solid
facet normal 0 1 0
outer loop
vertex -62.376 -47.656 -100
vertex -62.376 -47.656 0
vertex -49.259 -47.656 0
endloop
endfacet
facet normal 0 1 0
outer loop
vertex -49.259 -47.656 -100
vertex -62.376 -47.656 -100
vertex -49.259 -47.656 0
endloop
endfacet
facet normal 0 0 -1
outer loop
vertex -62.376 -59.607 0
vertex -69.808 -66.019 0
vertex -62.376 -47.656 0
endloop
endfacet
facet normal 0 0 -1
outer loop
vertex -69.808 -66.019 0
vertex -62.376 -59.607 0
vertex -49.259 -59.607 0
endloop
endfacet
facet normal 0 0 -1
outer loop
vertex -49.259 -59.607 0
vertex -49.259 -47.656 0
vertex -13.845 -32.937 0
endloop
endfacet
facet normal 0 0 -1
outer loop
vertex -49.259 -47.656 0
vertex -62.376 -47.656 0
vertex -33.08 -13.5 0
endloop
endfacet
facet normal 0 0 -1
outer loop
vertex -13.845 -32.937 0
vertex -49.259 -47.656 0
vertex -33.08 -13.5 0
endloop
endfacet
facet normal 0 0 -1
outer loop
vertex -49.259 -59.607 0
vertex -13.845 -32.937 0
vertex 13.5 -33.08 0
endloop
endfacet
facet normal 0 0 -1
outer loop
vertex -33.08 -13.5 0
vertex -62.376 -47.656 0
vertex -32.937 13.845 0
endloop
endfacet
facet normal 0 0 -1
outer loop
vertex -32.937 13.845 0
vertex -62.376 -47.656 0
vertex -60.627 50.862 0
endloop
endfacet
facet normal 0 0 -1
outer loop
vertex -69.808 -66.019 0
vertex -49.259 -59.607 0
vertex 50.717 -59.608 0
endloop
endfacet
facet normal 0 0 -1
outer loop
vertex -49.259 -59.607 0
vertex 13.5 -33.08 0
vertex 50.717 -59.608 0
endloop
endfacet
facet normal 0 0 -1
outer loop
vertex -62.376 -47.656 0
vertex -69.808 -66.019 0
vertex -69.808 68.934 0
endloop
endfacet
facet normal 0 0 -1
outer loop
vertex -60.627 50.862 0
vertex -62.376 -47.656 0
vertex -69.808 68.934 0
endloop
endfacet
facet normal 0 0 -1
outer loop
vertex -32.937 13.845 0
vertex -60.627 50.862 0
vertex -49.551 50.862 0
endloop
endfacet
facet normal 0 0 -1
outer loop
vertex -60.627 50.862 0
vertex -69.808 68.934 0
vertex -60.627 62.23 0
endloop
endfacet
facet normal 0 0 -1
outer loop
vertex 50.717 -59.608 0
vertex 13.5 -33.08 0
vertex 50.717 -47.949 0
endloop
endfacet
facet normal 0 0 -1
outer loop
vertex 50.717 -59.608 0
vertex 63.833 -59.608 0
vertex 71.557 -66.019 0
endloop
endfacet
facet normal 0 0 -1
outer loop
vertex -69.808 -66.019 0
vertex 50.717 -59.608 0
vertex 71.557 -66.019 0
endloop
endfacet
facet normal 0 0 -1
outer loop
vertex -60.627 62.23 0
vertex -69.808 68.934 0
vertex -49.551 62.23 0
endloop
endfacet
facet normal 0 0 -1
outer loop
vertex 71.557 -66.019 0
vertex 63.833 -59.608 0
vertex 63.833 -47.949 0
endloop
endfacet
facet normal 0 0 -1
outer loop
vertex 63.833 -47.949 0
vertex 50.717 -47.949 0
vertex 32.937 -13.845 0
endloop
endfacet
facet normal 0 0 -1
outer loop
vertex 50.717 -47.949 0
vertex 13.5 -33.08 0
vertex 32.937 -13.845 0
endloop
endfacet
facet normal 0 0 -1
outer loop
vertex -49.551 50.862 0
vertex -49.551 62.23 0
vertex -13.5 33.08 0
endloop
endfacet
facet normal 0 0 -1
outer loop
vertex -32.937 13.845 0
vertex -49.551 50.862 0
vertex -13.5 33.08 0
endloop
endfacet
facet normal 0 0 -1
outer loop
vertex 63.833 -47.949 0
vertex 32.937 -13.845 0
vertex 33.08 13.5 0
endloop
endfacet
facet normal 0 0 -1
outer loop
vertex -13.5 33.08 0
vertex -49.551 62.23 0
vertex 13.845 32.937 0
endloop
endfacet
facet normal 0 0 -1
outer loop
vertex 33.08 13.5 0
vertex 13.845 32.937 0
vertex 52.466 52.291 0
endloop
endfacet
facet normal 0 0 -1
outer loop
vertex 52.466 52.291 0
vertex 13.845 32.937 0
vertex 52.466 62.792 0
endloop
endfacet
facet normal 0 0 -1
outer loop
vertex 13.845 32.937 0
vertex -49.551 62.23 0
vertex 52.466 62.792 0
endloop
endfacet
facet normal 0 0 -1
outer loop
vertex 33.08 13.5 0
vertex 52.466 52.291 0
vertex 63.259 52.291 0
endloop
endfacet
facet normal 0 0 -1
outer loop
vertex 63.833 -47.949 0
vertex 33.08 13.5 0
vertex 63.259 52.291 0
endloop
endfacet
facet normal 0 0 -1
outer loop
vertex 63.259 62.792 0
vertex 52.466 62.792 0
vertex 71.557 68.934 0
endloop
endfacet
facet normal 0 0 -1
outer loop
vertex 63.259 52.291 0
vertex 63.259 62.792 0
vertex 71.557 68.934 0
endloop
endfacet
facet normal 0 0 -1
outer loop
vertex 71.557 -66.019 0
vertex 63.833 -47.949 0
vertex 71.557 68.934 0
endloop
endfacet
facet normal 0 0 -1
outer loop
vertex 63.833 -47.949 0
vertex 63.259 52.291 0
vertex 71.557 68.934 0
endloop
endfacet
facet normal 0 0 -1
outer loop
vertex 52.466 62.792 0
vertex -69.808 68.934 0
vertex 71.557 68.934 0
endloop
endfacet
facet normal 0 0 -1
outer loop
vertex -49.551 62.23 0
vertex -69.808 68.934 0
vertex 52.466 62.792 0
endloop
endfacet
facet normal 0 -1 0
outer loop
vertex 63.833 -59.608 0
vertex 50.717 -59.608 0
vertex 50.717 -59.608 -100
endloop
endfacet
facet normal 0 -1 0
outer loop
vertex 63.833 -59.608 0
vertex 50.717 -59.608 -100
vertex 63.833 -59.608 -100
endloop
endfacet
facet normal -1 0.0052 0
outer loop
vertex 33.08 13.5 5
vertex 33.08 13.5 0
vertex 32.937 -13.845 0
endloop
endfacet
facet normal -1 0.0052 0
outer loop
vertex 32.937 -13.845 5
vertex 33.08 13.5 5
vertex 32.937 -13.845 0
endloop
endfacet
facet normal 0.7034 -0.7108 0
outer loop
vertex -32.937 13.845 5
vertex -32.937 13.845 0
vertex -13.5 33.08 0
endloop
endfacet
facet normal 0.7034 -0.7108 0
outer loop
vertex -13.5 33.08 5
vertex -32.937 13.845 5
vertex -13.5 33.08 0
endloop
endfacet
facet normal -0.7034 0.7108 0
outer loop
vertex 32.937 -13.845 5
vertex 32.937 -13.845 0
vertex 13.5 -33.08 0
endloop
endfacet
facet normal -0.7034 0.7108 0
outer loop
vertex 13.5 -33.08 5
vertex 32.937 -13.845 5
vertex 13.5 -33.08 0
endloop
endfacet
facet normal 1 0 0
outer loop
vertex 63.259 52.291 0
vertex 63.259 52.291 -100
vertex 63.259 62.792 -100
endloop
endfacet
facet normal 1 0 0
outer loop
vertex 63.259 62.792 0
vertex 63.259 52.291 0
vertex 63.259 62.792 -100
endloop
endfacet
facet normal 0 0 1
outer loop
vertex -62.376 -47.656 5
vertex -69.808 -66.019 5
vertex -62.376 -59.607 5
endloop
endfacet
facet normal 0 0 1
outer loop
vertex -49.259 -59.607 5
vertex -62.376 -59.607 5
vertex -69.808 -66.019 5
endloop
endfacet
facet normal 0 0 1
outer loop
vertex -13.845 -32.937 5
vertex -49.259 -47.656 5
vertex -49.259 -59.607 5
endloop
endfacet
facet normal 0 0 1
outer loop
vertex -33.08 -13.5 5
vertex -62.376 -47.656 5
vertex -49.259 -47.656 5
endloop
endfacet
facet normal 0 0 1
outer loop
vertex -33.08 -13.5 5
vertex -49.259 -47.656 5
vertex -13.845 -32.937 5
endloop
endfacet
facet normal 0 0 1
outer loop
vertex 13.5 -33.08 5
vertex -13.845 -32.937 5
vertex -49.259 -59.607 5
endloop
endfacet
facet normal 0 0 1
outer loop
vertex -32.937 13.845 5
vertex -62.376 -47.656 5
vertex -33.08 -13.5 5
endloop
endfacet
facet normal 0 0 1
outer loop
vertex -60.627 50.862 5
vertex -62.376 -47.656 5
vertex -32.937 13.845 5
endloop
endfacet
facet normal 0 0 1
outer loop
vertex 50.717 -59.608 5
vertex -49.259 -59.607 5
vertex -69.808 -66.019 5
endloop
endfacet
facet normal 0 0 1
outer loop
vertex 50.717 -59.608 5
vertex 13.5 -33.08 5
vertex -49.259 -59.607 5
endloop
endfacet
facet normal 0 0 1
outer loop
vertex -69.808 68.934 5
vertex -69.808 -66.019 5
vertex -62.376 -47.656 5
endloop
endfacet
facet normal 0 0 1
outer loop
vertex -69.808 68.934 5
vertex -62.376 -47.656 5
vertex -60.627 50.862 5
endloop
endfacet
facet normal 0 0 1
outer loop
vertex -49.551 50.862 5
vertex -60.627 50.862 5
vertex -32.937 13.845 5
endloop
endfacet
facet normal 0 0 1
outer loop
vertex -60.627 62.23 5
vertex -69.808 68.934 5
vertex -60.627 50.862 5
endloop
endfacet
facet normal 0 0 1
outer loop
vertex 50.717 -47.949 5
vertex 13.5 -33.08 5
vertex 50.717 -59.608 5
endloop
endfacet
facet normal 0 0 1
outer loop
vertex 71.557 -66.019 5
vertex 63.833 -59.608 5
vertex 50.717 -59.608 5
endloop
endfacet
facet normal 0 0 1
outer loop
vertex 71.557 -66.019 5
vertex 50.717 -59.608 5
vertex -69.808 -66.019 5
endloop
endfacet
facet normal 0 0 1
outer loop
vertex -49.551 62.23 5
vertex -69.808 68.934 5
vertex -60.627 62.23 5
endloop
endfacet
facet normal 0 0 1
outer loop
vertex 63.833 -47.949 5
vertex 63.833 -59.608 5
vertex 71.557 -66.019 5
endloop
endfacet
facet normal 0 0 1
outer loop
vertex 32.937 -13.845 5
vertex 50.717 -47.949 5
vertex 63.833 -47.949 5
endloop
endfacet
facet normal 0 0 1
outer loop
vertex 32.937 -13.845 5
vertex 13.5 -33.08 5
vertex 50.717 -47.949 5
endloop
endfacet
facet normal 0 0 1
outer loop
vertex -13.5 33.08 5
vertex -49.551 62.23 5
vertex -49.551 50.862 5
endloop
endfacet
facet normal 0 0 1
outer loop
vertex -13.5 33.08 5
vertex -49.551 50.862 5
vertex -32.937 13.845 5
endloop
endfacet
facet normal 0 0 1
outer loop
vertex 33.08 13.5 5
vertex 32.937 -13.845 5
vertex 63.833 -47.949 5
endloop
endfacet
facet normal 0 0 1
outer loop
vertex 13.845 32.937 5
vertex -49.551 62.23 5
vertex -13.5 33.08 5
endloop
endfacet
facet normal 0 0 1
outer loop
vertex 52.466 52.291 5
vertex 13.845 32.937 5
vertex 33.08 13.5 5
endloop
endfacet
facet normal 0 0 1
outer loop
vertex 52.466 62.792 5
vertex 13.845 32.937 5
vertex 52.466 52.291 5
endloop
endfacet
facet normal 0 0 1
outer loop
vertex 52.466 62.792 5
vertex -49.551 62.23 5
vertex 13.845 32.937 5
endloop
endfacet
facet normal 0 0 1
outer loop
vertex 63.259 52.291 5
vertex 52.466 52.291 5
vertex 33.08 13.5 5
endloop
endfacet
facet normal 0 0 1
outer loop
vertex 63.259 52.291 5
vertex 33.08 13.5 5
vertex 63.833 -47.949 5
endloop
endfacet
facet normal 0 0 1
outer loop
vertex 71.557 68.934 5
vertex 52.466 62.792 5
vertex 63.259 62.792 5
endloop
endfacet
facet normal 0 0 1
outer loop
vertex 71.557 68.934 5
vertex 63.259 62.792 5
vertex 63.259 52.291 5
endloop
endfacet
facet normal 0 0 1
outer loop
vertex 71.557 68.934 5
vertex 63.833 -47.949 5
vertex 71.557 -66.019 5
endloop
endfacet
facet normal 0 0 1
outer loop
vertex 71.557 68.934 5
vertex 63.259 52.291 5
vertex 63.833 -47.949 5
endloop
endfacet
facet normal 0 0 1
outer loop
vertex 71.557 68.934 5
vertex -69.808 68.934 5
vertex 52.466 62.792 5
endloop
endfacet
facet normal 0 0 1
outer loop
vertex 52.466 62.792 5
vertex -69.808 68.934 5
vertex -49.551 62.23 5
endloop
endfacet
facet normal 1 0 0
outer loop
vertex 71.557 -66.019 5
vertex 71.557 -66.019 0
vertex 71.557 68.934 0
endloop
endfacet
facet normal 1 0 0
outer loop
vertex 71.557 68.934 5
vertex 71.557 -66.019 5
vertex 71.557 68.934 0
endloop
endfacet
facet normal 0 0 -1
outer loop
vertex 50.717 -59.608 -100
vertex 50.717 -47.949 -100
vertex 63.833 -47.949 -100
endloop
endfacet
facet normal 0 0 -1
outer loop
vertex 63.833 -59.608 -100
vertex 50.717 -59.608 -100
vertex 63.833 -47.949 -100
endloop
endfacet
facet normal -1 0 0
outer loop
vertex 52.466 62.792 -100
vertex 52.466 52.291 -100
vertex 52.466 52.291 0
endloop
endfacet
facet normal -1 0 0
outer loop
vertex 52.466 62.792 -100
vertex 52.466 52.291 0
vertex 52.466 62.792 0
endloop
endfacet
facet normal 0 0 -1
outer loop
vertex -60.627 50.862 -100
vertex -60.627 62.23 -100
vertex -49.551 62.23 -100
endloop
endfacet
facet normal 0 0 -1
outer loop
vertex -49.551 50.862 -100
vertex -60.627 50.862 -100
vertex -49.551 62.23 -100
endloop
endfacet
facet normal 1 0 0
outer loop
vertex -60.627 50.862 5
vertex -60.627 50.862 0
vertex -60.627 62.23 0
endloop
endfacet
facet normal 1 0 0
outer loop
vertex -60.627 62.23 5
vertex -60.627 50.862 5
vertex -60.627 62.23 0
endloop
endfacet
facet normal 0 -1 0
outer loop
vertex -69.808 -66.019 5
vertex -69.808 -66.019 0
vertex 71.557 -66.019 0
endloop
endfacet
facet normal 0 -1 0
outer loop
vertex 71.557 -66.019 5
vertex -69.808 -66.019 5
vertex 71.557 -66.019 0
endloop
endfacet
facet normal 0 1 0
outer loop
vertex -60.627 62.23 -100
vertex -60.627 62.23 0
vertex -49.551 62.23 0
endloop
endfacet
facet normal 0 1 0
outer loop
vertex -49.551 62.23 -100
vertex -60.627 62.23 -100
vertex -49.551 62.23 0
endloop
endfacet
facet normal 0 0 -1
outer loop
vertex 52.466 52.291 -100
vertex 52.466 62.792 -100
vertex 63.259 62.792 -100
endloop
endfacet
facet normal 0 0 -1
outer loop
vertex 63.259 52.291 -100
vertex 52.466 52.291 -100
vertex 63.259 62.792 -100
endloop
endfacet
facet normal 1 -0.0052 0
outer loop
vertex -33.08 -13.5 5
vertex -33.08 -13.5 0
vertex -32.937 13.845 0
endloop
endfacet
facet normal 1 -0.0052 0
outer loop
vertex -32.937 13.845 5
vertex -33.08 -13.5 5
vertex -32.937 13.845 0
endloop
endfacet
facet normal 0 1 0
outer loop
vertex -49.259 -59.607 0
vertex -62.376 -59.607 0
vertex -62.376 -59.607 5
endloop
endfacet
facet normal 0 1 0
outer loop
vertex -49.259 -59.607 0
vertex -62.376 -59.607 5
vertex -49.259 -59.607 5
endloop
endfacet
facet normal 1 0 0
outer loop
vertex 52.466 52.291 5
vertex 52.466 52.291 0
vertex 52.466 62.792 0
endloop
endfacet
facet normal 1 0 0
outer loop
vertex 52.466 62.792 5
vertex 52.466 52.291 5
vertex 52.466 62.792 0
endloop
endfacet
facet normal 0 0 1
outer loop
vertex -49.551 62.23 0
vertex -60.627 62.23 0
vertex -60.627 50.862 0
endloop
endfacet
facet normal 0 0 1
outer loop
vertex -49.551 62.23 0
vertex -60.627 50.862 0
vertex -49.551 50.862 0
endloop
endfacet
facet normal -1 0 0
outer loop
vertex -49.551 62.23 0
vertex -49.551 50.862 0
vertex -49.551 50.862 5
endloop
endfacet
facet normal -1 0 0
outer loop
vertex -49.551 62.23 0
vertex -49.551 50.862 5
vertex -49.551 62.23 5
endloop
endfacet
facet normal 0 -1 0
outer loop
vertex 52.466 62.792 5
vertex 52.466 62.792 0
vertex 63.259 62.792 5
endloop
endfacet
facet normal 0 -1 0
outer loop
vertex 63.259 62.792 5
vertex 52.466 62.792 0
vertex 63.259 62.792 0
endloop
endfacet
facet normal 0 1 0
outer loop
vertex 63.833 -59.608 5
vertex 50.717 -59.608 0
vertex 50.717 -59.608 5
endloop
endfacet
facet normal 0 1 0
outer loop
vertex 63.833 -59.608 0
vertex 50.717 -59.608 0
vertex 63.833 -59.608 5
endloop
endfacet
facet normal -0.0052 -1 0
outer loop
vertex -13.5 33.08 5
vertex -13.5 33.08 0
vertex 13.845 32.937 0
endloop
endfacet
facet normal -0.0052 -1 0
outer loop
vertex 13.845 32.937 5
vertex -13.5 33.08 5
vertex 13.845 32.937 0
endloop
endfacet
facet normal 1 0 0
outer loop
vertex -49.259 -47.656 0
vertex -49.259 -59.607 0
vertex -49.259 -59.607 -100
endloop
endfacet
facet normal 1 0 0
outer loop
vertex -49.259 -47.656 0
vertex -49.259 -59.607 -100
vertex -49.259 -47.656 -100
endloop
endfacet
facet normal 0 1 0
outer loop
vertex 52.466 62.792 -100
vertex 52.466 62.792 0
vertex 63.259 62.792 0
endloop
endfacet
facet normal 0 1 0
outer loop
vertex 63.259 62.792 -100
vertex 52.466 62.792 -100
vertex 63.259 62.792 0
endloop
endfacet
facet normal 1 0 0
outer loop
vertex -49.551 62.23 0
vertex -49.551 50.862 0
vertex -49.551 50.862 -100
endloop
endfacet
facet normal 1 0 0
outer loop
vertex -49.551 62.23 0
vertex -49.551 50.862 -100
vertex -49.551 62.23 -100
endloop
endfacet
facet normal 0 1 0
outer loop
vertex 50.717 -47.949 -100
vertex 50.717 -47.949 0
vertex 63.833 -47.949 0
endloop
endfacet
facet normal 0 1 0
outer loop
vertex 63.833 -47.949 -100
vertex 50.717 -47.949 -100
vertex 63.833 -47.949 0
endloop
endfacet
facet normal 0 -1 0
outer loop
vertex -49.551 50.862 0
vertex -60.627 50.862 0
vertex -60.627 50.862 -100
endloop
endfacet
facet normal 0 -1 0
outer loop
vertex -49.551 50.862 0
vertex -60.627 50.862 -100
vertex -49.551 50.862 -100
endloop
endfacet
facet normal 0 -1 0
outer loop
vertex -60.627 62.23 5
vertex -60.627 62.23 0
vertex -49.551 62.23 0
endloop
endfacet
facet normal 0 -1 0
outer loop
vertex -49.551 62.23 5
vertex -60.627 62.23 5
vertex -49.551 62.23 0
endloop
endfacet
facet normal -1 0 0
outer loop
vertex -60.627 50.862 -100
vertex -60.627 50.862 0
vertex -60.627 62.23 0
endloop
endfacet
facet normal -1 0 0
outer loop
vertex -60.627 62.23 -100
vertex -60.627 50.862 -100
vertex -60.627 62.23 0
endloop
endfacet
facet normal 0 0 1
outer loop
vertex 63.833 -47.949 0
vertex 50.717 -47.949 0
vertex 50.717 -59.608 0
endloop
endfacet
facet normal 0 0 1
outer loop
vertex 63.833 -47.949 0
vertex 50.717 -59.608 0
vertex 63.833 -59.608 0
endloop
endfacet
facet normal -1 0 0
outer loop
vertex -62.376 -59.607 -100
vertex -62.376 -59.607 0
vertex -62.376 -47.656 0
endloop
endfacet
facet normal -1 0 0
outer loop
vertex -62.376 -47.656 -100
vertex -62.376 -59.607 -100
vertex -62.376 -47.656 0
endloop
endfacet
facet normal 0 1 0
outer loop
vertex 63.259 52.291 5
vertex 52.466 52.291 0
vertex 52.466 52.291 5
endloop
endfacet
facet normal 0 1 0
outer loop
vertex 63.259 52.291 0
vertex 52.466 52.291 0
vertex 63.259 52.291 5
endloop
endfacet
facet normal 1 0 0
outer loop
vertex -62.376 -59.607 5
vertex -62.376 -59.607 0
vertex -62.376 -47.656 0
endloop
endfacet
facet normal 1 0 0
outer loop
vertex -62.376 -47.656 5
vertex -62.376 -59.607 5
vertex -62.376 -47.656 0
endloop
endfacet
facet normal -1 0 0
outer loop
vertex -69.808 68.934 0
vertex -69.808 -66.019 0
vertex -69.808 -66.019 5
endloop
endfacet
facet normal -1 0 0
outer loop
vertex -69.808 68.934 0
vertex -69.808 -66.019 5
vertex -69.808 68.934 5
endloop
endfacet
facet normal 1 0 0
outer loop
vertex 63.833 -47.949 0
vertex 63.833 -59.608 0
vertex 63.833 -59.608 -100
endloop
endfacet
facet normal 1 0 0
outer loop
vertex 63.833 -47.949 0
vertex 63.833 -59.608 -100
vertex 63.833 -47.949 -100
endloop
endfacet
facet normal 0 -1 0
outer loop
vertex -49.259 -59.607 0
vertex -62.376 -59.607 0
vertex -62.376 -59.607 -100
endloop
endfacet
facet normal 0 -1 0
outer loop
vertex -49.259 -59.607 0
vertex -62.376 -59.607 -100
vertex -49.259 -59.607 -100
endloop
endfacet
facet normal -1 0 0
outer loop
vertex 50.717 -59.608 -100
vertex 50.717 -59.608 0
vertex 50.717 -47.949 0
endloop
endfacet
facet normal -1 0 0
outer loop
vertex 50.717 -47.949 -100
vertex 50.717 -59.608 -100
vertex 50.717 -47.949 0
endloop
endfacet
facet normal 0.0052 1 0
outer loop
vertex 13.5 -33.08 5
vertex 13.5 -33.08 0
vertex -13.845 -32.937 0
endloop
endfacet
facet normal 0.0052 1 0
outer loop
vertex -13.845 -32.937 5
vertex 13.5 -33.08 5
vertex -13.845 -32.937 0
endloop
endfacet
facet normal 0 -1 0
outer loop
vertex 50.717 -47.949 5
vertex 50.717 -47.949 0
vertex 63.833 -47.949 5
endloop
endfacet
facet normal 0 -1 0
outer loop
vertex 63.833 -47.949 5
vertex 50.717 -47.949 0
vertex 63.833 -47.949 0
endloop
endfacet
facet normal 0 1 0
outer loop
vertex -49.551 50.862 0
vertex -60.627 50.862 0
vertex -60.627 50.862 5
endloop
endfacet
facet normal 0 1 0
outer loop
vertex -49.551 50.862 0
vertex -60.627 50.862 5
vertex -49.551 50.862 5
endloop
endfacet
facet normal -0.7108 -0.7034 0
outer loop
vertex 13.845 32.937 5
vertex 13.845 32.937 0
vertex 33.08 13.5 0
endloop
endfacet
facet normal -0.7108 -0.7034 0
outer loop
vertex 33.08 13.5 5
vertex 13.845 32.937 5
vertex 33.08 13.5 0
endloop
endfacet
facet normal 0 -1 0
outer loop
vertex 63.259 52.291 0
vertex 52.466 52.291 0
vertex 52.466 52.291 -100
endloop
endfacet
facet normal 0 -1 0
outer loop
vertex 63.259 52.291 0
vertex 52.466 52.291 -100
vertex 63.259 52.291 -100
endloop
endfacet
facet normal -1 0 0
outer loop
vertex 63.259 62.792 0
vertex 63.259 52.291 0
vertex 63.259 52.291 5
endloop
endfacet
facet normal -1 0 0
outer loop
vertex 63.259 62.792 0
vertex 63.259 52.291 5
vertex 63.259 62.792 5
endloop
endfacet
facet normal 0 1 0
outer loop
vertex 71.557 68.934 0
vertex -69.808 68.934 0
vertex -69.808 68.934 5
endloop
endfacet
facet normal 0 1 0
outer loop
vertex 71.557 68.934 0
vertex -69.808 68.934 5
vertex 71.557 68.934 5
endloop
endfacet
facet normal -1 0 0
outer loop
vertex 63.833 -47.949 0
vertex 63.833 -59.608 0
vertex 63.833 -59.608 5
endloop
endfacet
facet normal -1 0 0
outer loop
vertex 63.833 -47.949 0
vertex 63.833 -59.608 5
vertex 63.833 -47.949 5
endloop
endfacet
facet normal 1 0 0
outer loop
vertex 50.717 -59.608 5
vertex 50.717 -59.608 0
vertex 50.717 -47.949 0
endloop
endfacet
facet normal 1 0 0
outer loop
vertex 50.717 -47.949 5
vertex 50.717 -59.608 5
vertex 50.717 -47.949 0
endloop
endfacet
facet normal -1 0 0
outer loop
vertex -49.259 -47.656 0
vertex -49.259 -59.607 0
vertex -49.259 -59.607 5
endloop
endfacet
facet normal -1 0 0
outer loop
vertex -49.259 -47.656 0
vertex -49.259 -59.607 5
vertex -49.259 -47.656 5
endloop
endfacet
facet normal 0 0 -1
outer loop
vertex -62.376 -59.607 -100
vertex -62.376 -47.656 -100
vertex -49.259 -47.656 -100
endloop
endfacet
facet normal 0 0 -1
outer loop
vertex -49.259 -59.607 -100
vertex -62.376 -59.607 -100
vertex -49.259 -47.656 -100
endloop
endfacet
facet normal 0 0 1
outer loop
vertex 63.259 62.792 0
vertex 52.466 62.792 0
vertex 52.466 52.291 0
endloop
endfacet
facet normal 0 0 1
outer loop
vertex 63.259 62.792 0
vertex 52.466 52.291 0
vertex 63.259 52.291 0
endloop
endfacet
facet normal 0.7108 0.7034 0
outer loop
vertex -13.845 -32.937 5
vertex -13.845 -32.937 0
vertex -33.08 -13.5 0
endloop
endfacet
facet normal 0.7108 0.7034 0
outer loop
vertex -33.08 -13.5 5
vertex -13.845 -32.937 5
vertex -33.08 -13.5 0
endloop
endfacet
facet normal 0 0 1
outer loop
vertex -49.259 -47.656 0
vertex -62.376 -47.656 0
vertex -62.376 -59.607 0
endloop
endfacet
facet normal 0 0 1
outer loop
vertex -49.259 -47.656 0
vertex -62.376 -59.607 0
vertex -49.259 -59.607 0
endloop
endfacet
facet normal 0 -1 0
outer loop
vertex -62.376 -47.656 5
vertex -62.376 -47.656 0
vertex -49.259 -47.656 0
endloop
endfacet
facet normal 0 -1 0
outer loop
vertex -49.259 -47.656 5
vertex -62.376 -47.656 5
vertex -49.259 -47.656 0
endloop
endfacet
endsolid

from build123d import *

# Parameters (mm, degrees)
F0_W     = 141.36558
F0_H     = 134.953111
F0_W_2   = 13.116393
F0_H_2   = 11.950489
F0_W_3   = 13.116396
F0_H_3   = 11.659436
F0_W_4   = 11.076067
F0_H_4   = 11.367541
F0_W_5   = 10.792881
F0_H_5   = 10.500871
F1_DEPTH = 5
F2_DEPTH = 5
F3_DEPTH = 100


with BuildPart() as f1:
    # F0 (on Top) → F1 (new body)
    with BuildSketch(Plane.XY):
        with Locations((0.874426, 1.457378)):
            Rectangle(F0_W, F0_H)
        with Locations((-55.817543, -53.631475)):
            Rectangle(F0_W_2, F0_H_2, mode=Mode.SUBTRACT)
        Polygon((-32.936722, 13.845082), (-13.499828, 33.079731), (13.845082, 32.936722), (33.079731, 13.499828), (32.936722, -13.845082), (13.499828, -33.079731), (-13.845082, -32.936722), (-33.079731, -13.499828), align=None, mode=Mode.SUBTRACT)
        with Locations((57.274919, -53.778503)):
            Rectangle(F0_W_3, F0_H_3, mode=Mode.SUBTRACT)
        with Locations((-55.088853, 56.546231)):
            Rectangle(F0_W_4, F0_H_4, mode=Mode.SUBTRACT)
        with Locations((57.862371, 57.541772)):
            Rectangle(F0_W_5, F0_H_5, mode=Mode.SUBTRACT)
    extrude(amount=F1_DEPTH)

    # F0 (on Top) → F2 (join)
    with BuildSketch(Plane.XY):
        with Locations((0.874426, 1.457378)):
            Rectangle(F0_W, F0_H)
        with Locations((-55.817543, -53.631475)):
            Rectangle(F0_W_2, F0_H_2, mode=Mode.SUBTRACT)
        Polygon((-32.936722, 13.845082), (-13.499828, 33.079731), (13.845082, 32.936722), (33.079731, 13.499828), (32.936722, -13.845082), (13.499828, -33.079731), (-13.845082, -32.936722), (-33.079731, -13.499828), align=None, mode=Mode.SUBTRACT)
        with Locations((57.274919, -53.778503)):
            Rectangle(F0_W_3, F0_H_3, mode=Mode.SUBTRACT)
        with Locations((-55.088853, 56.546231)):
            Rectangle(F0_W_4, F0_H_4, mode=Mode.SUBTRACT)
        with Locations((57.862371, 57.541772)):
            Rectangle(F0_W_5, F0_H_5, mode=Mode.SUBTRACT)
    extrude(amount=F2_DEPTH)


with BuildPart() as f3:
    # F0 (on Top) → F3 (new body)
    with BuildSketch(Plane.XY):
        with Locations((-55.088853, 56.546231)):
            Rectangle(F0_W_4, F0_H_4)
        with Locations((-55.817543, -53.631475)):
            Rectangle(F0_W_2, F0_H_2)
        with Locations((57.274919, -53.778503)):
            Rectangle(F0_W_3, F0_H_3)
        with Locations((57.862371, 57.541772)):
            Rectangle(F0_W_5, F0_H_5)
    extrude(amount=-F3_DEPTH)


solid = Compound([f1.part, f3.part])
